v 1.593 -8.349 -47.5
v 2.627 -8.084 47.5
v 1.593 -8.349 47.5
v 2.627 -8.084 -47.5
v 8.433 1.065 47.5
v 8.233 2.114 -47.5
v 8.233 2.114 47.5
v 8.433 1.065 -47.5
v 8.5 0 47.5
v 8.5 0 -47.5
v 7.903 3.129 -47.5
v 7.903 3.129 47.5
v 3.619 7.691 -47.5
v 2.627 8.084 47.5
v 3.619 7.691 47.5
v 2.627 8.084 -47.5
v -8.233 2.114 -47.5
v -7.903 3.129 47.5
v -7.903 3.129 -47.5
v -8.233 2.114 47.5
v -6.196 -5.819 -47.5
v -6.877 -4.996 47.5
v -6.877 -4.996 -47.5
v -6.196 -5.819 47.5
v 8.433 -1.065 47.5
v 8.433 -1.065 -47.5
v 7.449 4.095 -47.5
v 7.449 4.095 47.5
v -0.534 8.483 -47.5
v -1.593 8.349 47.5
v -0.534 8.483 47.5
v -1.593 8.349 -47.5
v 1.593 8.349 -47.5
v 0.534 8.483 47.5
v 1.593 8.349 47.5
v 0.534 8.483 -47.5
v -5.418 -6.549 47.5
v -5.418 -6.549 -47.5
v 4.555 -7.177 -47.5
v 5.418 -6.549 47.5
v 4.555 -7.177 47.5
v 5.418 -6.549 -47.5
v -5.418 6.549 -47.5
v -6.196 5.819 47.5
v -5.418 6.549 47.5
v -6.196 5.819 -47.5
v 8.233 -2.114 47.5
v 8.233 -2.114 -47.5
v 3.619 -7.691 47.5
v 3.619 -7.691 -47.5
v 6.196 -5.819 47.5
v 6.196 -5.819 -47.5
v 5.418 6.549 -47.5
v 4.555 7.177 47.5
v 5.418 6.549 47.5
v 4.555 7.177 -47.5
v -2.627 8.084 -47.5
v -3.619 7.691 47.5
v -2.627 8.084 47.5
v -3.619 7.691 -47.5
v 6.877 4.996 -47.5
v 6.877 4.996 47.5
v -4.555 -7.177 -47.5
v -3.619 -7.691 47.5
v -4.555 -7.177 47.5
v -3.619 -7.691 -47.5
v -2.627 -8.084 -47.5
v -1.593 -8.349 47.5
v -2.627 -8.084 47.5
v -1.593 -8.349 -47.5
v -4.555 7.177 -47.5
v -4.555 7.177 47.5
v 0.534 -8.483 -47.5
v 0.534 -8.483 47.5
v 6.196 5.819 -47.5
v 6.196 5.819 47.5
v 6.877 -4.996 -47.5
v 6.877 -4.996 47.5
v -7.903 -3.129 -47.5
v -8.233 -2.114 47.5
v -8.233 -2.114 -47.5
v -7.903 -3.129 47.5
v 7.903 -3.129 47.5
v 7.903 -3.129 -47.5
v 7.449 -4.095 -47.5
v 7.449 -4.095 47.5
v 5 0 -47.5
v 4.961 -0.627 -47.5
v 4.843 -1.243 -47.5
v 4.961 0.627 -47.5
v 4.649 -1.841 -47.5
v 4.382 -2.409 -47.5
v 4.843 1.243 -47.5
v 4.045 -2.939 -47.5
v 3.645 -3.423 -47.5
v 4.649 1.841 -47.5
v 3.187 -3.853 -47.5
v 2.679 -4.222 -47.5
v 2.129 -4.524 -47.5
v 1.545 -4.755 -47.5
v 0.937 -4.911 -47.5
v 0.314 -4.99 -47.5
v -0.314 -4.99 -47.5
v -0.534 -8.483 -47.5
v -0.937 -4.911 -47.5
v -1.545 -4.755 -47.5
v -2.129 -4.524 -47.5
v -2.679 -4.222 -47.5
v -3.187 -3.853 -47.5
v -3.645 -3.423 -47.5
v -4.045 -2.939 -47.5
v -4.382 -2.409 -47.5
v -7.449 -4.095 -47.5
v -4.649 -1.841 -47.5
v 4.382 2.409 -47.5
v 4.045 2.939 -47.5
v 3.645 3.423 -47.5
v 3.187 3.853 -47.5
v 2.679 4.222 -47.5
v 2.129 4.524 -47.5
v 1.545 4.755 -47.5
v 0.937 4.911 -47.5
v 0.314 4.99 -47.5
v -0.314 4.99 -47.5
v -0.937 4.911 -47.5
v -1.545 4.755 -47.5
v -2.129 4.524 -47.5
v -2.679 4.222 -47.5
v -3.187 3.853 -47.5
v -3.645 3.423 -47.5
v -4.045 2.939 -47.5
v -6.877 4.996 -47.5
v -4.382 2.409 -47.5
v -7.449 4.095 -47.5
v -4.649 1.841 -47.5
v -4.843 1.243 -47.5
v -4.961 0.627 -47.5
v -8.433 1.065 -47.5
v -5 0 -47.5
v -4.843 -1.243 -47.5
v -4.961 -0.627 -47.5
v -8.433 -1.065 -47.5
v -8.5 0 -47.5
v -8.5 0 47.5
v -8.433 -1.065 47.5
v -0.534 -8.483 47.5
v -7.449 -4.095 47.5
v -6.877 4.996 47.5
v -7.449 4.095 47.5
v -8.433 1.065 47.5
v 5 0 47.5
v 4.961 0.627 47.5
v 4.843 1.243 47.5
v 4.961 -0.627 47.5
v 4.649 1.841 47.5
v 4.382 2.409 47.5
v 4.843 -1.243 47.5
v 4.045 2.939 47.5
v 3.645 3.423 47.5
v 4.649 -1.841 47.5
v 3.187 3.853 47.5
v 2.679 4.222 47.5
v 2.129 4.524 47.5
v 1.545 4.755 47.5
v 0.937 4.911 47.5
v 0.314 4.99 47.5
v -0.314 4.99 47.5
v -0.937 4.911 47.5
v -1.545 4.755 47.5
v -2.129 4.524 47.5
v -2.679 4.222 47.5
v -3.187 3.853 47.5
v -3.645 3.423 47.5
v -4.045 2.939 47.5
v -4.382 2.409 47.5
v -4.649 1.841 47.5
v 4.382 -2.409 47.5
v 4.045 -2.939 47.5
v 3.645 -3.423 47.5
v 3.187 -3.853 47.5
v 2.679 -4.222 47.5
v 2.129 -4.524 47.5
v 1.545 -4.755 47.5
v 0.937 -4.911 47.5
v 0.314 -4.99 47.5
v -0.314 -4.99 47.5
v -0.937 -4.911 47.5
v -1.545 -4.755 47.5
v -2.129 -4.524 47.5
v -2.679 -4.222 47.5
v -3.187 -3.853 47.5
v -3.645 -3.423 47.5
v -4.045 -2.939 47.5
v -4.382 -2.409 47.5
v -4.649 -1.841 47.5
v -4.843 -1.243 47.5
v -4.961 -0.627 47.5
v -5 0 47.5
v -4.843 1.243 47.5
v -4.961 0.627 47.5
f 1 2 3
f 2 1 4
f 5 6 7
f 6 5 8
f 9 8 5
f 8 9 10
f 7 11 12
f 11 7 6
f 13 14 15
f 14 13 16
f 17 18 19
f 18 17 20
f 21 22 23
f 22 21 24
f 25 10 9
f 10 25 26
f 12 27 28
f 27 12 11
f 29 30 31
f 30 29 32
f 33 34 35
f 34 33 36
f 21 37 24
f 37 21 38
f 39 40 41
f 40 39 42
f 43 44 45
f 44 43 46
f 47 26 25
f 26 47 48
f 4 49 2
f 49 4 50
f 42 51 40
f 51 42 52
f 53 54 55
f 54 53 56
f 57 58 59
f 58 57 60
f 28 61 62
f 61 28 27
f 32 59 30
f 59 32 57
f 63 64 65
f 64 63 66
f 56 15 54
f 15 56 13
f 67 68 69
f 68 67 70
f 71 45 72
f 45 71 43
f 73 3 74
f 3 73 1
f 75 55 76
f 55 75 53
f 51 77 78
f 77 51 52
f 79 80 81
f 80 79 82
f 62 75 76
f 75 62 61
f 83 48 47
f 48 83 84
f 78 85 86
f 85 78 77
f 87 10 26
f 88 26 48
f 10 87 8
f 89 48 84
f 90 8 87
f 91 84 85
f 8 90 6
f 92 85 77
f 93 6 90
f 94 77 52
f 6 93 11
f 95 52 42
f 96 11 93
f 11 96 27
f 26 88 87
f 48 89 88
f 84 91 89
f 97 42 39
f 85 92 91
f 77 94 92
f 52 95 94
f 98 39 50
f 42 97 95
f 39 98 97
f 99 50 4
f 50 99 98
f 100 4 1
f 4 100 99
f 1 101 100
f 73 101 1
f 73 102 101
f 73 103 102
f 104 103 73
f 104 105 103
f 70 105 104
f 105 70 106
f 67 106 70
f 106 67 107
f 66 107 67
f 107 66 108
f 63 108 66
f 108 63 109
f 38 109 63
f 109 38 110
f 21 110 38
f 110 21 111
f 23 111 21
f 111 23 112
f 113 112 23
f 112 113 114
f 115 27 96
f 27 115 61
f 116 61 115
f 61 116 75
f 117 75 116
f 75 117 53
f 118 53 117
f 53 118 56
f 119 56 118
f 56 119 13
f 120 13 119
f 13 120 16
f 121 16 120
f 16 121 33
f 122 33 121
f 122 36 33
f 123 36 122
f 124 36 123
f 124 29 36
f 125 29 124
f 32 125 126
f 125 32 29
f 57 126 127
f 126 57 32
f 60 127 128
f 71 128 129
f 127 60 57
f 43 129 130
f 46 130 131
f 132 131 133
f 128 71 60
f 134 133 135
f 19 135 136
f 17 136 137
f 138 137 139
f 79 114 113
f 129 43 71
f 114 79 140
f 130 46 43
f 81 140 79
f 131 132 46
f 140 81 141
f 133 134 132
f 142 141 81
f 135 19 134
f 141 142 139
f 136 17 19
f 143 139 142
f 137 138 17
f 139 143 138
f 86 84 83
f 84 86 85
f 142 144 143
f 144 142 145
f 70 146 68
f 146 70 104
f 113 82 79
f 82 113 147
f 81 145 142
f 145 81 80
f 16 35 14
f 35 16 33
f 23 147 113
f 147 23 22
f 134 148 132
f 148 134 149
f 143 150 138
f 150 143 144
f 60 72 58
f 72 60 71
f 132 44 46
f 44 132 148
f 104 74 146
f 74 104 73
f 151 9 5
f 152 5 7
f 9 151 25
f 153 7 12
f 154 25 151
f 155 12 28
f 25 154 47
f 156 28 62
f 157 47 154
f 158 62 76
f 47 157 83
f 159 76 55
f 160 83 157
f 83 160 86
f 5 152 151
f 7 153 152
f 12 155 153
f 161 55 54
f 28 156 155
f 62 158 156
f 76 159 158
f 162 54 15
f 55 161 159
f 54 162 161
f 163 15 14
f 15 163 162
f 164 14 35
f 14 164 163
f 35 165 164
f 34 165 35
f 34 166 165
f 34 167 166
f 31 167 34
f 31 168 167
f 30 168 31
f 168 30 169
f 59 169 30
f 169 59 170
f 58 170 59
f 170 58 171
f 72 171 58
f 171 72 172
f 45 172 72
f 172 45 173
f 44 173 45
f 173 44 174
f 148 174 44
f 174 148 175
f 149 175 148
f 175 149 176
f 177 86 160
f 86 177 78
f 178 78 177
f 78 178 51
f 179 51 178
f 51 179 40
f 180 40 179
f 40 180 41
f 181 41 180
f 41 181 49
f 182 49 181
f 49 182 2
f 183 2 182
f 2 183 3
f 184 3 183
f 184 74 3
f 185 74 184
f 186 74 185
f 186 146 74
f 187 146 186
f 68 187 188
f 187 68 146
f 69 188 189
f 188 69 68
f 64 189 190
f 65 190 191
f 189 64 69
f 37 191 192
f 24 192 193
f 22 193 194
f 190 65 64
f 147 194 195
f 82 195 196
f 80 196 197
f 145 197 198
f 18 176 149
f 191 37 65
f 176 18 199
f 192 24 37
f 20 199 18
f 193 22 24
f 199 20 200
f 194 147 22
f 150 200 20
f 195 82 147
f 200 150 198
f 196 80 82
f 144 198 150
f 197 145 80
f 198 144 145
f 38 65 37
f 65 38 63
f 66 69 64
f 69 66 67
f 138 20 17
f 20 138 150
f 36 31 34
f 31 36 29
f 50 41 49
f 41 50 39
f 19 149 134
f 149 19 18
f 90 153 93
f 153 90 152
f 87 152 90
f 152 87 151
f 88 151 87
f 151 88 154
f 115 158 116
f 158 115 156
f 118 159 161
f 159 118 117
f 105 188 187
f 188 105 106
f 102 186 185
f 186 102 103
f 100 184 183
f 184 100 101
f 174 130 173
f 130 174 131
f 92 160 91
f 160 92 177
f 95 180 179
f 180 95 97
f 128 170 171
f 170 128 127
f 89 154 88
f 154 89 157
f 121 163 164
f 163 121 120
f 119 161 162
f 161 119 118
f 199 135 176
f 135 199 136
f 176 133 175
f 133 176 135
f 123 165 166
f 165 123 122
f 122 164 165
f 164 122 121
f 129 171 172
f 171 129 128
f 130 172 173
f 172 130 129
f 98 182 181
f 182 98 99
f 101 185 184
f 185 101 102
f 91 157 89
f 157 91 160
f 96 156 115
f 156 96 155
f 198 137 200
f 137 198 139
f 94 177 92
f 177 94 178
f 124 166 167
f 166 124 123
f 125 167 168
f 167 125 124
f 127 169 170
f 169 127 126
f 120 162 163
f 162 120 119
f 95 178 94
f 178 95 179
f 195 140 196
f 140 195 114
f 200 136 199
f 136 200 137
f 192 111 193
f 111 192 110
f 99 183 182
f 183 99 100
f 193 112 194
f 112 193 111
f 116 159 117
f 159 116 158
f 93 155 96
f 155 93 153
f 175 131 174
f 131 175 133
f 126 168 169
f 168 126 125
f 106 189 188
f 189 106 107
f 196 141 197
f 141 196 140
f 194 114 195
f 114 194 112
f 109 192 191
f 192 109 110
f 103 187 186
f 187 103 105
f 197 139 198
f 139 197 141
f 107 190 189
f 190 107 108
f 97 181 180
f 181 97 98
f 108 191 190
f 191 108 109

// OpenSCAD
$fn = 50;


difference() {
	union() {
		translate(v = [0, 0, -47.5000000000]) {
			cylinder(h = 95, r = 8.5000000000);
		}
	}
	union() {
		translate(v = [0, 0, -100.0000000000]) {
			cylinder(h = 200, r = 5.0000000000);
		}
	}
}
